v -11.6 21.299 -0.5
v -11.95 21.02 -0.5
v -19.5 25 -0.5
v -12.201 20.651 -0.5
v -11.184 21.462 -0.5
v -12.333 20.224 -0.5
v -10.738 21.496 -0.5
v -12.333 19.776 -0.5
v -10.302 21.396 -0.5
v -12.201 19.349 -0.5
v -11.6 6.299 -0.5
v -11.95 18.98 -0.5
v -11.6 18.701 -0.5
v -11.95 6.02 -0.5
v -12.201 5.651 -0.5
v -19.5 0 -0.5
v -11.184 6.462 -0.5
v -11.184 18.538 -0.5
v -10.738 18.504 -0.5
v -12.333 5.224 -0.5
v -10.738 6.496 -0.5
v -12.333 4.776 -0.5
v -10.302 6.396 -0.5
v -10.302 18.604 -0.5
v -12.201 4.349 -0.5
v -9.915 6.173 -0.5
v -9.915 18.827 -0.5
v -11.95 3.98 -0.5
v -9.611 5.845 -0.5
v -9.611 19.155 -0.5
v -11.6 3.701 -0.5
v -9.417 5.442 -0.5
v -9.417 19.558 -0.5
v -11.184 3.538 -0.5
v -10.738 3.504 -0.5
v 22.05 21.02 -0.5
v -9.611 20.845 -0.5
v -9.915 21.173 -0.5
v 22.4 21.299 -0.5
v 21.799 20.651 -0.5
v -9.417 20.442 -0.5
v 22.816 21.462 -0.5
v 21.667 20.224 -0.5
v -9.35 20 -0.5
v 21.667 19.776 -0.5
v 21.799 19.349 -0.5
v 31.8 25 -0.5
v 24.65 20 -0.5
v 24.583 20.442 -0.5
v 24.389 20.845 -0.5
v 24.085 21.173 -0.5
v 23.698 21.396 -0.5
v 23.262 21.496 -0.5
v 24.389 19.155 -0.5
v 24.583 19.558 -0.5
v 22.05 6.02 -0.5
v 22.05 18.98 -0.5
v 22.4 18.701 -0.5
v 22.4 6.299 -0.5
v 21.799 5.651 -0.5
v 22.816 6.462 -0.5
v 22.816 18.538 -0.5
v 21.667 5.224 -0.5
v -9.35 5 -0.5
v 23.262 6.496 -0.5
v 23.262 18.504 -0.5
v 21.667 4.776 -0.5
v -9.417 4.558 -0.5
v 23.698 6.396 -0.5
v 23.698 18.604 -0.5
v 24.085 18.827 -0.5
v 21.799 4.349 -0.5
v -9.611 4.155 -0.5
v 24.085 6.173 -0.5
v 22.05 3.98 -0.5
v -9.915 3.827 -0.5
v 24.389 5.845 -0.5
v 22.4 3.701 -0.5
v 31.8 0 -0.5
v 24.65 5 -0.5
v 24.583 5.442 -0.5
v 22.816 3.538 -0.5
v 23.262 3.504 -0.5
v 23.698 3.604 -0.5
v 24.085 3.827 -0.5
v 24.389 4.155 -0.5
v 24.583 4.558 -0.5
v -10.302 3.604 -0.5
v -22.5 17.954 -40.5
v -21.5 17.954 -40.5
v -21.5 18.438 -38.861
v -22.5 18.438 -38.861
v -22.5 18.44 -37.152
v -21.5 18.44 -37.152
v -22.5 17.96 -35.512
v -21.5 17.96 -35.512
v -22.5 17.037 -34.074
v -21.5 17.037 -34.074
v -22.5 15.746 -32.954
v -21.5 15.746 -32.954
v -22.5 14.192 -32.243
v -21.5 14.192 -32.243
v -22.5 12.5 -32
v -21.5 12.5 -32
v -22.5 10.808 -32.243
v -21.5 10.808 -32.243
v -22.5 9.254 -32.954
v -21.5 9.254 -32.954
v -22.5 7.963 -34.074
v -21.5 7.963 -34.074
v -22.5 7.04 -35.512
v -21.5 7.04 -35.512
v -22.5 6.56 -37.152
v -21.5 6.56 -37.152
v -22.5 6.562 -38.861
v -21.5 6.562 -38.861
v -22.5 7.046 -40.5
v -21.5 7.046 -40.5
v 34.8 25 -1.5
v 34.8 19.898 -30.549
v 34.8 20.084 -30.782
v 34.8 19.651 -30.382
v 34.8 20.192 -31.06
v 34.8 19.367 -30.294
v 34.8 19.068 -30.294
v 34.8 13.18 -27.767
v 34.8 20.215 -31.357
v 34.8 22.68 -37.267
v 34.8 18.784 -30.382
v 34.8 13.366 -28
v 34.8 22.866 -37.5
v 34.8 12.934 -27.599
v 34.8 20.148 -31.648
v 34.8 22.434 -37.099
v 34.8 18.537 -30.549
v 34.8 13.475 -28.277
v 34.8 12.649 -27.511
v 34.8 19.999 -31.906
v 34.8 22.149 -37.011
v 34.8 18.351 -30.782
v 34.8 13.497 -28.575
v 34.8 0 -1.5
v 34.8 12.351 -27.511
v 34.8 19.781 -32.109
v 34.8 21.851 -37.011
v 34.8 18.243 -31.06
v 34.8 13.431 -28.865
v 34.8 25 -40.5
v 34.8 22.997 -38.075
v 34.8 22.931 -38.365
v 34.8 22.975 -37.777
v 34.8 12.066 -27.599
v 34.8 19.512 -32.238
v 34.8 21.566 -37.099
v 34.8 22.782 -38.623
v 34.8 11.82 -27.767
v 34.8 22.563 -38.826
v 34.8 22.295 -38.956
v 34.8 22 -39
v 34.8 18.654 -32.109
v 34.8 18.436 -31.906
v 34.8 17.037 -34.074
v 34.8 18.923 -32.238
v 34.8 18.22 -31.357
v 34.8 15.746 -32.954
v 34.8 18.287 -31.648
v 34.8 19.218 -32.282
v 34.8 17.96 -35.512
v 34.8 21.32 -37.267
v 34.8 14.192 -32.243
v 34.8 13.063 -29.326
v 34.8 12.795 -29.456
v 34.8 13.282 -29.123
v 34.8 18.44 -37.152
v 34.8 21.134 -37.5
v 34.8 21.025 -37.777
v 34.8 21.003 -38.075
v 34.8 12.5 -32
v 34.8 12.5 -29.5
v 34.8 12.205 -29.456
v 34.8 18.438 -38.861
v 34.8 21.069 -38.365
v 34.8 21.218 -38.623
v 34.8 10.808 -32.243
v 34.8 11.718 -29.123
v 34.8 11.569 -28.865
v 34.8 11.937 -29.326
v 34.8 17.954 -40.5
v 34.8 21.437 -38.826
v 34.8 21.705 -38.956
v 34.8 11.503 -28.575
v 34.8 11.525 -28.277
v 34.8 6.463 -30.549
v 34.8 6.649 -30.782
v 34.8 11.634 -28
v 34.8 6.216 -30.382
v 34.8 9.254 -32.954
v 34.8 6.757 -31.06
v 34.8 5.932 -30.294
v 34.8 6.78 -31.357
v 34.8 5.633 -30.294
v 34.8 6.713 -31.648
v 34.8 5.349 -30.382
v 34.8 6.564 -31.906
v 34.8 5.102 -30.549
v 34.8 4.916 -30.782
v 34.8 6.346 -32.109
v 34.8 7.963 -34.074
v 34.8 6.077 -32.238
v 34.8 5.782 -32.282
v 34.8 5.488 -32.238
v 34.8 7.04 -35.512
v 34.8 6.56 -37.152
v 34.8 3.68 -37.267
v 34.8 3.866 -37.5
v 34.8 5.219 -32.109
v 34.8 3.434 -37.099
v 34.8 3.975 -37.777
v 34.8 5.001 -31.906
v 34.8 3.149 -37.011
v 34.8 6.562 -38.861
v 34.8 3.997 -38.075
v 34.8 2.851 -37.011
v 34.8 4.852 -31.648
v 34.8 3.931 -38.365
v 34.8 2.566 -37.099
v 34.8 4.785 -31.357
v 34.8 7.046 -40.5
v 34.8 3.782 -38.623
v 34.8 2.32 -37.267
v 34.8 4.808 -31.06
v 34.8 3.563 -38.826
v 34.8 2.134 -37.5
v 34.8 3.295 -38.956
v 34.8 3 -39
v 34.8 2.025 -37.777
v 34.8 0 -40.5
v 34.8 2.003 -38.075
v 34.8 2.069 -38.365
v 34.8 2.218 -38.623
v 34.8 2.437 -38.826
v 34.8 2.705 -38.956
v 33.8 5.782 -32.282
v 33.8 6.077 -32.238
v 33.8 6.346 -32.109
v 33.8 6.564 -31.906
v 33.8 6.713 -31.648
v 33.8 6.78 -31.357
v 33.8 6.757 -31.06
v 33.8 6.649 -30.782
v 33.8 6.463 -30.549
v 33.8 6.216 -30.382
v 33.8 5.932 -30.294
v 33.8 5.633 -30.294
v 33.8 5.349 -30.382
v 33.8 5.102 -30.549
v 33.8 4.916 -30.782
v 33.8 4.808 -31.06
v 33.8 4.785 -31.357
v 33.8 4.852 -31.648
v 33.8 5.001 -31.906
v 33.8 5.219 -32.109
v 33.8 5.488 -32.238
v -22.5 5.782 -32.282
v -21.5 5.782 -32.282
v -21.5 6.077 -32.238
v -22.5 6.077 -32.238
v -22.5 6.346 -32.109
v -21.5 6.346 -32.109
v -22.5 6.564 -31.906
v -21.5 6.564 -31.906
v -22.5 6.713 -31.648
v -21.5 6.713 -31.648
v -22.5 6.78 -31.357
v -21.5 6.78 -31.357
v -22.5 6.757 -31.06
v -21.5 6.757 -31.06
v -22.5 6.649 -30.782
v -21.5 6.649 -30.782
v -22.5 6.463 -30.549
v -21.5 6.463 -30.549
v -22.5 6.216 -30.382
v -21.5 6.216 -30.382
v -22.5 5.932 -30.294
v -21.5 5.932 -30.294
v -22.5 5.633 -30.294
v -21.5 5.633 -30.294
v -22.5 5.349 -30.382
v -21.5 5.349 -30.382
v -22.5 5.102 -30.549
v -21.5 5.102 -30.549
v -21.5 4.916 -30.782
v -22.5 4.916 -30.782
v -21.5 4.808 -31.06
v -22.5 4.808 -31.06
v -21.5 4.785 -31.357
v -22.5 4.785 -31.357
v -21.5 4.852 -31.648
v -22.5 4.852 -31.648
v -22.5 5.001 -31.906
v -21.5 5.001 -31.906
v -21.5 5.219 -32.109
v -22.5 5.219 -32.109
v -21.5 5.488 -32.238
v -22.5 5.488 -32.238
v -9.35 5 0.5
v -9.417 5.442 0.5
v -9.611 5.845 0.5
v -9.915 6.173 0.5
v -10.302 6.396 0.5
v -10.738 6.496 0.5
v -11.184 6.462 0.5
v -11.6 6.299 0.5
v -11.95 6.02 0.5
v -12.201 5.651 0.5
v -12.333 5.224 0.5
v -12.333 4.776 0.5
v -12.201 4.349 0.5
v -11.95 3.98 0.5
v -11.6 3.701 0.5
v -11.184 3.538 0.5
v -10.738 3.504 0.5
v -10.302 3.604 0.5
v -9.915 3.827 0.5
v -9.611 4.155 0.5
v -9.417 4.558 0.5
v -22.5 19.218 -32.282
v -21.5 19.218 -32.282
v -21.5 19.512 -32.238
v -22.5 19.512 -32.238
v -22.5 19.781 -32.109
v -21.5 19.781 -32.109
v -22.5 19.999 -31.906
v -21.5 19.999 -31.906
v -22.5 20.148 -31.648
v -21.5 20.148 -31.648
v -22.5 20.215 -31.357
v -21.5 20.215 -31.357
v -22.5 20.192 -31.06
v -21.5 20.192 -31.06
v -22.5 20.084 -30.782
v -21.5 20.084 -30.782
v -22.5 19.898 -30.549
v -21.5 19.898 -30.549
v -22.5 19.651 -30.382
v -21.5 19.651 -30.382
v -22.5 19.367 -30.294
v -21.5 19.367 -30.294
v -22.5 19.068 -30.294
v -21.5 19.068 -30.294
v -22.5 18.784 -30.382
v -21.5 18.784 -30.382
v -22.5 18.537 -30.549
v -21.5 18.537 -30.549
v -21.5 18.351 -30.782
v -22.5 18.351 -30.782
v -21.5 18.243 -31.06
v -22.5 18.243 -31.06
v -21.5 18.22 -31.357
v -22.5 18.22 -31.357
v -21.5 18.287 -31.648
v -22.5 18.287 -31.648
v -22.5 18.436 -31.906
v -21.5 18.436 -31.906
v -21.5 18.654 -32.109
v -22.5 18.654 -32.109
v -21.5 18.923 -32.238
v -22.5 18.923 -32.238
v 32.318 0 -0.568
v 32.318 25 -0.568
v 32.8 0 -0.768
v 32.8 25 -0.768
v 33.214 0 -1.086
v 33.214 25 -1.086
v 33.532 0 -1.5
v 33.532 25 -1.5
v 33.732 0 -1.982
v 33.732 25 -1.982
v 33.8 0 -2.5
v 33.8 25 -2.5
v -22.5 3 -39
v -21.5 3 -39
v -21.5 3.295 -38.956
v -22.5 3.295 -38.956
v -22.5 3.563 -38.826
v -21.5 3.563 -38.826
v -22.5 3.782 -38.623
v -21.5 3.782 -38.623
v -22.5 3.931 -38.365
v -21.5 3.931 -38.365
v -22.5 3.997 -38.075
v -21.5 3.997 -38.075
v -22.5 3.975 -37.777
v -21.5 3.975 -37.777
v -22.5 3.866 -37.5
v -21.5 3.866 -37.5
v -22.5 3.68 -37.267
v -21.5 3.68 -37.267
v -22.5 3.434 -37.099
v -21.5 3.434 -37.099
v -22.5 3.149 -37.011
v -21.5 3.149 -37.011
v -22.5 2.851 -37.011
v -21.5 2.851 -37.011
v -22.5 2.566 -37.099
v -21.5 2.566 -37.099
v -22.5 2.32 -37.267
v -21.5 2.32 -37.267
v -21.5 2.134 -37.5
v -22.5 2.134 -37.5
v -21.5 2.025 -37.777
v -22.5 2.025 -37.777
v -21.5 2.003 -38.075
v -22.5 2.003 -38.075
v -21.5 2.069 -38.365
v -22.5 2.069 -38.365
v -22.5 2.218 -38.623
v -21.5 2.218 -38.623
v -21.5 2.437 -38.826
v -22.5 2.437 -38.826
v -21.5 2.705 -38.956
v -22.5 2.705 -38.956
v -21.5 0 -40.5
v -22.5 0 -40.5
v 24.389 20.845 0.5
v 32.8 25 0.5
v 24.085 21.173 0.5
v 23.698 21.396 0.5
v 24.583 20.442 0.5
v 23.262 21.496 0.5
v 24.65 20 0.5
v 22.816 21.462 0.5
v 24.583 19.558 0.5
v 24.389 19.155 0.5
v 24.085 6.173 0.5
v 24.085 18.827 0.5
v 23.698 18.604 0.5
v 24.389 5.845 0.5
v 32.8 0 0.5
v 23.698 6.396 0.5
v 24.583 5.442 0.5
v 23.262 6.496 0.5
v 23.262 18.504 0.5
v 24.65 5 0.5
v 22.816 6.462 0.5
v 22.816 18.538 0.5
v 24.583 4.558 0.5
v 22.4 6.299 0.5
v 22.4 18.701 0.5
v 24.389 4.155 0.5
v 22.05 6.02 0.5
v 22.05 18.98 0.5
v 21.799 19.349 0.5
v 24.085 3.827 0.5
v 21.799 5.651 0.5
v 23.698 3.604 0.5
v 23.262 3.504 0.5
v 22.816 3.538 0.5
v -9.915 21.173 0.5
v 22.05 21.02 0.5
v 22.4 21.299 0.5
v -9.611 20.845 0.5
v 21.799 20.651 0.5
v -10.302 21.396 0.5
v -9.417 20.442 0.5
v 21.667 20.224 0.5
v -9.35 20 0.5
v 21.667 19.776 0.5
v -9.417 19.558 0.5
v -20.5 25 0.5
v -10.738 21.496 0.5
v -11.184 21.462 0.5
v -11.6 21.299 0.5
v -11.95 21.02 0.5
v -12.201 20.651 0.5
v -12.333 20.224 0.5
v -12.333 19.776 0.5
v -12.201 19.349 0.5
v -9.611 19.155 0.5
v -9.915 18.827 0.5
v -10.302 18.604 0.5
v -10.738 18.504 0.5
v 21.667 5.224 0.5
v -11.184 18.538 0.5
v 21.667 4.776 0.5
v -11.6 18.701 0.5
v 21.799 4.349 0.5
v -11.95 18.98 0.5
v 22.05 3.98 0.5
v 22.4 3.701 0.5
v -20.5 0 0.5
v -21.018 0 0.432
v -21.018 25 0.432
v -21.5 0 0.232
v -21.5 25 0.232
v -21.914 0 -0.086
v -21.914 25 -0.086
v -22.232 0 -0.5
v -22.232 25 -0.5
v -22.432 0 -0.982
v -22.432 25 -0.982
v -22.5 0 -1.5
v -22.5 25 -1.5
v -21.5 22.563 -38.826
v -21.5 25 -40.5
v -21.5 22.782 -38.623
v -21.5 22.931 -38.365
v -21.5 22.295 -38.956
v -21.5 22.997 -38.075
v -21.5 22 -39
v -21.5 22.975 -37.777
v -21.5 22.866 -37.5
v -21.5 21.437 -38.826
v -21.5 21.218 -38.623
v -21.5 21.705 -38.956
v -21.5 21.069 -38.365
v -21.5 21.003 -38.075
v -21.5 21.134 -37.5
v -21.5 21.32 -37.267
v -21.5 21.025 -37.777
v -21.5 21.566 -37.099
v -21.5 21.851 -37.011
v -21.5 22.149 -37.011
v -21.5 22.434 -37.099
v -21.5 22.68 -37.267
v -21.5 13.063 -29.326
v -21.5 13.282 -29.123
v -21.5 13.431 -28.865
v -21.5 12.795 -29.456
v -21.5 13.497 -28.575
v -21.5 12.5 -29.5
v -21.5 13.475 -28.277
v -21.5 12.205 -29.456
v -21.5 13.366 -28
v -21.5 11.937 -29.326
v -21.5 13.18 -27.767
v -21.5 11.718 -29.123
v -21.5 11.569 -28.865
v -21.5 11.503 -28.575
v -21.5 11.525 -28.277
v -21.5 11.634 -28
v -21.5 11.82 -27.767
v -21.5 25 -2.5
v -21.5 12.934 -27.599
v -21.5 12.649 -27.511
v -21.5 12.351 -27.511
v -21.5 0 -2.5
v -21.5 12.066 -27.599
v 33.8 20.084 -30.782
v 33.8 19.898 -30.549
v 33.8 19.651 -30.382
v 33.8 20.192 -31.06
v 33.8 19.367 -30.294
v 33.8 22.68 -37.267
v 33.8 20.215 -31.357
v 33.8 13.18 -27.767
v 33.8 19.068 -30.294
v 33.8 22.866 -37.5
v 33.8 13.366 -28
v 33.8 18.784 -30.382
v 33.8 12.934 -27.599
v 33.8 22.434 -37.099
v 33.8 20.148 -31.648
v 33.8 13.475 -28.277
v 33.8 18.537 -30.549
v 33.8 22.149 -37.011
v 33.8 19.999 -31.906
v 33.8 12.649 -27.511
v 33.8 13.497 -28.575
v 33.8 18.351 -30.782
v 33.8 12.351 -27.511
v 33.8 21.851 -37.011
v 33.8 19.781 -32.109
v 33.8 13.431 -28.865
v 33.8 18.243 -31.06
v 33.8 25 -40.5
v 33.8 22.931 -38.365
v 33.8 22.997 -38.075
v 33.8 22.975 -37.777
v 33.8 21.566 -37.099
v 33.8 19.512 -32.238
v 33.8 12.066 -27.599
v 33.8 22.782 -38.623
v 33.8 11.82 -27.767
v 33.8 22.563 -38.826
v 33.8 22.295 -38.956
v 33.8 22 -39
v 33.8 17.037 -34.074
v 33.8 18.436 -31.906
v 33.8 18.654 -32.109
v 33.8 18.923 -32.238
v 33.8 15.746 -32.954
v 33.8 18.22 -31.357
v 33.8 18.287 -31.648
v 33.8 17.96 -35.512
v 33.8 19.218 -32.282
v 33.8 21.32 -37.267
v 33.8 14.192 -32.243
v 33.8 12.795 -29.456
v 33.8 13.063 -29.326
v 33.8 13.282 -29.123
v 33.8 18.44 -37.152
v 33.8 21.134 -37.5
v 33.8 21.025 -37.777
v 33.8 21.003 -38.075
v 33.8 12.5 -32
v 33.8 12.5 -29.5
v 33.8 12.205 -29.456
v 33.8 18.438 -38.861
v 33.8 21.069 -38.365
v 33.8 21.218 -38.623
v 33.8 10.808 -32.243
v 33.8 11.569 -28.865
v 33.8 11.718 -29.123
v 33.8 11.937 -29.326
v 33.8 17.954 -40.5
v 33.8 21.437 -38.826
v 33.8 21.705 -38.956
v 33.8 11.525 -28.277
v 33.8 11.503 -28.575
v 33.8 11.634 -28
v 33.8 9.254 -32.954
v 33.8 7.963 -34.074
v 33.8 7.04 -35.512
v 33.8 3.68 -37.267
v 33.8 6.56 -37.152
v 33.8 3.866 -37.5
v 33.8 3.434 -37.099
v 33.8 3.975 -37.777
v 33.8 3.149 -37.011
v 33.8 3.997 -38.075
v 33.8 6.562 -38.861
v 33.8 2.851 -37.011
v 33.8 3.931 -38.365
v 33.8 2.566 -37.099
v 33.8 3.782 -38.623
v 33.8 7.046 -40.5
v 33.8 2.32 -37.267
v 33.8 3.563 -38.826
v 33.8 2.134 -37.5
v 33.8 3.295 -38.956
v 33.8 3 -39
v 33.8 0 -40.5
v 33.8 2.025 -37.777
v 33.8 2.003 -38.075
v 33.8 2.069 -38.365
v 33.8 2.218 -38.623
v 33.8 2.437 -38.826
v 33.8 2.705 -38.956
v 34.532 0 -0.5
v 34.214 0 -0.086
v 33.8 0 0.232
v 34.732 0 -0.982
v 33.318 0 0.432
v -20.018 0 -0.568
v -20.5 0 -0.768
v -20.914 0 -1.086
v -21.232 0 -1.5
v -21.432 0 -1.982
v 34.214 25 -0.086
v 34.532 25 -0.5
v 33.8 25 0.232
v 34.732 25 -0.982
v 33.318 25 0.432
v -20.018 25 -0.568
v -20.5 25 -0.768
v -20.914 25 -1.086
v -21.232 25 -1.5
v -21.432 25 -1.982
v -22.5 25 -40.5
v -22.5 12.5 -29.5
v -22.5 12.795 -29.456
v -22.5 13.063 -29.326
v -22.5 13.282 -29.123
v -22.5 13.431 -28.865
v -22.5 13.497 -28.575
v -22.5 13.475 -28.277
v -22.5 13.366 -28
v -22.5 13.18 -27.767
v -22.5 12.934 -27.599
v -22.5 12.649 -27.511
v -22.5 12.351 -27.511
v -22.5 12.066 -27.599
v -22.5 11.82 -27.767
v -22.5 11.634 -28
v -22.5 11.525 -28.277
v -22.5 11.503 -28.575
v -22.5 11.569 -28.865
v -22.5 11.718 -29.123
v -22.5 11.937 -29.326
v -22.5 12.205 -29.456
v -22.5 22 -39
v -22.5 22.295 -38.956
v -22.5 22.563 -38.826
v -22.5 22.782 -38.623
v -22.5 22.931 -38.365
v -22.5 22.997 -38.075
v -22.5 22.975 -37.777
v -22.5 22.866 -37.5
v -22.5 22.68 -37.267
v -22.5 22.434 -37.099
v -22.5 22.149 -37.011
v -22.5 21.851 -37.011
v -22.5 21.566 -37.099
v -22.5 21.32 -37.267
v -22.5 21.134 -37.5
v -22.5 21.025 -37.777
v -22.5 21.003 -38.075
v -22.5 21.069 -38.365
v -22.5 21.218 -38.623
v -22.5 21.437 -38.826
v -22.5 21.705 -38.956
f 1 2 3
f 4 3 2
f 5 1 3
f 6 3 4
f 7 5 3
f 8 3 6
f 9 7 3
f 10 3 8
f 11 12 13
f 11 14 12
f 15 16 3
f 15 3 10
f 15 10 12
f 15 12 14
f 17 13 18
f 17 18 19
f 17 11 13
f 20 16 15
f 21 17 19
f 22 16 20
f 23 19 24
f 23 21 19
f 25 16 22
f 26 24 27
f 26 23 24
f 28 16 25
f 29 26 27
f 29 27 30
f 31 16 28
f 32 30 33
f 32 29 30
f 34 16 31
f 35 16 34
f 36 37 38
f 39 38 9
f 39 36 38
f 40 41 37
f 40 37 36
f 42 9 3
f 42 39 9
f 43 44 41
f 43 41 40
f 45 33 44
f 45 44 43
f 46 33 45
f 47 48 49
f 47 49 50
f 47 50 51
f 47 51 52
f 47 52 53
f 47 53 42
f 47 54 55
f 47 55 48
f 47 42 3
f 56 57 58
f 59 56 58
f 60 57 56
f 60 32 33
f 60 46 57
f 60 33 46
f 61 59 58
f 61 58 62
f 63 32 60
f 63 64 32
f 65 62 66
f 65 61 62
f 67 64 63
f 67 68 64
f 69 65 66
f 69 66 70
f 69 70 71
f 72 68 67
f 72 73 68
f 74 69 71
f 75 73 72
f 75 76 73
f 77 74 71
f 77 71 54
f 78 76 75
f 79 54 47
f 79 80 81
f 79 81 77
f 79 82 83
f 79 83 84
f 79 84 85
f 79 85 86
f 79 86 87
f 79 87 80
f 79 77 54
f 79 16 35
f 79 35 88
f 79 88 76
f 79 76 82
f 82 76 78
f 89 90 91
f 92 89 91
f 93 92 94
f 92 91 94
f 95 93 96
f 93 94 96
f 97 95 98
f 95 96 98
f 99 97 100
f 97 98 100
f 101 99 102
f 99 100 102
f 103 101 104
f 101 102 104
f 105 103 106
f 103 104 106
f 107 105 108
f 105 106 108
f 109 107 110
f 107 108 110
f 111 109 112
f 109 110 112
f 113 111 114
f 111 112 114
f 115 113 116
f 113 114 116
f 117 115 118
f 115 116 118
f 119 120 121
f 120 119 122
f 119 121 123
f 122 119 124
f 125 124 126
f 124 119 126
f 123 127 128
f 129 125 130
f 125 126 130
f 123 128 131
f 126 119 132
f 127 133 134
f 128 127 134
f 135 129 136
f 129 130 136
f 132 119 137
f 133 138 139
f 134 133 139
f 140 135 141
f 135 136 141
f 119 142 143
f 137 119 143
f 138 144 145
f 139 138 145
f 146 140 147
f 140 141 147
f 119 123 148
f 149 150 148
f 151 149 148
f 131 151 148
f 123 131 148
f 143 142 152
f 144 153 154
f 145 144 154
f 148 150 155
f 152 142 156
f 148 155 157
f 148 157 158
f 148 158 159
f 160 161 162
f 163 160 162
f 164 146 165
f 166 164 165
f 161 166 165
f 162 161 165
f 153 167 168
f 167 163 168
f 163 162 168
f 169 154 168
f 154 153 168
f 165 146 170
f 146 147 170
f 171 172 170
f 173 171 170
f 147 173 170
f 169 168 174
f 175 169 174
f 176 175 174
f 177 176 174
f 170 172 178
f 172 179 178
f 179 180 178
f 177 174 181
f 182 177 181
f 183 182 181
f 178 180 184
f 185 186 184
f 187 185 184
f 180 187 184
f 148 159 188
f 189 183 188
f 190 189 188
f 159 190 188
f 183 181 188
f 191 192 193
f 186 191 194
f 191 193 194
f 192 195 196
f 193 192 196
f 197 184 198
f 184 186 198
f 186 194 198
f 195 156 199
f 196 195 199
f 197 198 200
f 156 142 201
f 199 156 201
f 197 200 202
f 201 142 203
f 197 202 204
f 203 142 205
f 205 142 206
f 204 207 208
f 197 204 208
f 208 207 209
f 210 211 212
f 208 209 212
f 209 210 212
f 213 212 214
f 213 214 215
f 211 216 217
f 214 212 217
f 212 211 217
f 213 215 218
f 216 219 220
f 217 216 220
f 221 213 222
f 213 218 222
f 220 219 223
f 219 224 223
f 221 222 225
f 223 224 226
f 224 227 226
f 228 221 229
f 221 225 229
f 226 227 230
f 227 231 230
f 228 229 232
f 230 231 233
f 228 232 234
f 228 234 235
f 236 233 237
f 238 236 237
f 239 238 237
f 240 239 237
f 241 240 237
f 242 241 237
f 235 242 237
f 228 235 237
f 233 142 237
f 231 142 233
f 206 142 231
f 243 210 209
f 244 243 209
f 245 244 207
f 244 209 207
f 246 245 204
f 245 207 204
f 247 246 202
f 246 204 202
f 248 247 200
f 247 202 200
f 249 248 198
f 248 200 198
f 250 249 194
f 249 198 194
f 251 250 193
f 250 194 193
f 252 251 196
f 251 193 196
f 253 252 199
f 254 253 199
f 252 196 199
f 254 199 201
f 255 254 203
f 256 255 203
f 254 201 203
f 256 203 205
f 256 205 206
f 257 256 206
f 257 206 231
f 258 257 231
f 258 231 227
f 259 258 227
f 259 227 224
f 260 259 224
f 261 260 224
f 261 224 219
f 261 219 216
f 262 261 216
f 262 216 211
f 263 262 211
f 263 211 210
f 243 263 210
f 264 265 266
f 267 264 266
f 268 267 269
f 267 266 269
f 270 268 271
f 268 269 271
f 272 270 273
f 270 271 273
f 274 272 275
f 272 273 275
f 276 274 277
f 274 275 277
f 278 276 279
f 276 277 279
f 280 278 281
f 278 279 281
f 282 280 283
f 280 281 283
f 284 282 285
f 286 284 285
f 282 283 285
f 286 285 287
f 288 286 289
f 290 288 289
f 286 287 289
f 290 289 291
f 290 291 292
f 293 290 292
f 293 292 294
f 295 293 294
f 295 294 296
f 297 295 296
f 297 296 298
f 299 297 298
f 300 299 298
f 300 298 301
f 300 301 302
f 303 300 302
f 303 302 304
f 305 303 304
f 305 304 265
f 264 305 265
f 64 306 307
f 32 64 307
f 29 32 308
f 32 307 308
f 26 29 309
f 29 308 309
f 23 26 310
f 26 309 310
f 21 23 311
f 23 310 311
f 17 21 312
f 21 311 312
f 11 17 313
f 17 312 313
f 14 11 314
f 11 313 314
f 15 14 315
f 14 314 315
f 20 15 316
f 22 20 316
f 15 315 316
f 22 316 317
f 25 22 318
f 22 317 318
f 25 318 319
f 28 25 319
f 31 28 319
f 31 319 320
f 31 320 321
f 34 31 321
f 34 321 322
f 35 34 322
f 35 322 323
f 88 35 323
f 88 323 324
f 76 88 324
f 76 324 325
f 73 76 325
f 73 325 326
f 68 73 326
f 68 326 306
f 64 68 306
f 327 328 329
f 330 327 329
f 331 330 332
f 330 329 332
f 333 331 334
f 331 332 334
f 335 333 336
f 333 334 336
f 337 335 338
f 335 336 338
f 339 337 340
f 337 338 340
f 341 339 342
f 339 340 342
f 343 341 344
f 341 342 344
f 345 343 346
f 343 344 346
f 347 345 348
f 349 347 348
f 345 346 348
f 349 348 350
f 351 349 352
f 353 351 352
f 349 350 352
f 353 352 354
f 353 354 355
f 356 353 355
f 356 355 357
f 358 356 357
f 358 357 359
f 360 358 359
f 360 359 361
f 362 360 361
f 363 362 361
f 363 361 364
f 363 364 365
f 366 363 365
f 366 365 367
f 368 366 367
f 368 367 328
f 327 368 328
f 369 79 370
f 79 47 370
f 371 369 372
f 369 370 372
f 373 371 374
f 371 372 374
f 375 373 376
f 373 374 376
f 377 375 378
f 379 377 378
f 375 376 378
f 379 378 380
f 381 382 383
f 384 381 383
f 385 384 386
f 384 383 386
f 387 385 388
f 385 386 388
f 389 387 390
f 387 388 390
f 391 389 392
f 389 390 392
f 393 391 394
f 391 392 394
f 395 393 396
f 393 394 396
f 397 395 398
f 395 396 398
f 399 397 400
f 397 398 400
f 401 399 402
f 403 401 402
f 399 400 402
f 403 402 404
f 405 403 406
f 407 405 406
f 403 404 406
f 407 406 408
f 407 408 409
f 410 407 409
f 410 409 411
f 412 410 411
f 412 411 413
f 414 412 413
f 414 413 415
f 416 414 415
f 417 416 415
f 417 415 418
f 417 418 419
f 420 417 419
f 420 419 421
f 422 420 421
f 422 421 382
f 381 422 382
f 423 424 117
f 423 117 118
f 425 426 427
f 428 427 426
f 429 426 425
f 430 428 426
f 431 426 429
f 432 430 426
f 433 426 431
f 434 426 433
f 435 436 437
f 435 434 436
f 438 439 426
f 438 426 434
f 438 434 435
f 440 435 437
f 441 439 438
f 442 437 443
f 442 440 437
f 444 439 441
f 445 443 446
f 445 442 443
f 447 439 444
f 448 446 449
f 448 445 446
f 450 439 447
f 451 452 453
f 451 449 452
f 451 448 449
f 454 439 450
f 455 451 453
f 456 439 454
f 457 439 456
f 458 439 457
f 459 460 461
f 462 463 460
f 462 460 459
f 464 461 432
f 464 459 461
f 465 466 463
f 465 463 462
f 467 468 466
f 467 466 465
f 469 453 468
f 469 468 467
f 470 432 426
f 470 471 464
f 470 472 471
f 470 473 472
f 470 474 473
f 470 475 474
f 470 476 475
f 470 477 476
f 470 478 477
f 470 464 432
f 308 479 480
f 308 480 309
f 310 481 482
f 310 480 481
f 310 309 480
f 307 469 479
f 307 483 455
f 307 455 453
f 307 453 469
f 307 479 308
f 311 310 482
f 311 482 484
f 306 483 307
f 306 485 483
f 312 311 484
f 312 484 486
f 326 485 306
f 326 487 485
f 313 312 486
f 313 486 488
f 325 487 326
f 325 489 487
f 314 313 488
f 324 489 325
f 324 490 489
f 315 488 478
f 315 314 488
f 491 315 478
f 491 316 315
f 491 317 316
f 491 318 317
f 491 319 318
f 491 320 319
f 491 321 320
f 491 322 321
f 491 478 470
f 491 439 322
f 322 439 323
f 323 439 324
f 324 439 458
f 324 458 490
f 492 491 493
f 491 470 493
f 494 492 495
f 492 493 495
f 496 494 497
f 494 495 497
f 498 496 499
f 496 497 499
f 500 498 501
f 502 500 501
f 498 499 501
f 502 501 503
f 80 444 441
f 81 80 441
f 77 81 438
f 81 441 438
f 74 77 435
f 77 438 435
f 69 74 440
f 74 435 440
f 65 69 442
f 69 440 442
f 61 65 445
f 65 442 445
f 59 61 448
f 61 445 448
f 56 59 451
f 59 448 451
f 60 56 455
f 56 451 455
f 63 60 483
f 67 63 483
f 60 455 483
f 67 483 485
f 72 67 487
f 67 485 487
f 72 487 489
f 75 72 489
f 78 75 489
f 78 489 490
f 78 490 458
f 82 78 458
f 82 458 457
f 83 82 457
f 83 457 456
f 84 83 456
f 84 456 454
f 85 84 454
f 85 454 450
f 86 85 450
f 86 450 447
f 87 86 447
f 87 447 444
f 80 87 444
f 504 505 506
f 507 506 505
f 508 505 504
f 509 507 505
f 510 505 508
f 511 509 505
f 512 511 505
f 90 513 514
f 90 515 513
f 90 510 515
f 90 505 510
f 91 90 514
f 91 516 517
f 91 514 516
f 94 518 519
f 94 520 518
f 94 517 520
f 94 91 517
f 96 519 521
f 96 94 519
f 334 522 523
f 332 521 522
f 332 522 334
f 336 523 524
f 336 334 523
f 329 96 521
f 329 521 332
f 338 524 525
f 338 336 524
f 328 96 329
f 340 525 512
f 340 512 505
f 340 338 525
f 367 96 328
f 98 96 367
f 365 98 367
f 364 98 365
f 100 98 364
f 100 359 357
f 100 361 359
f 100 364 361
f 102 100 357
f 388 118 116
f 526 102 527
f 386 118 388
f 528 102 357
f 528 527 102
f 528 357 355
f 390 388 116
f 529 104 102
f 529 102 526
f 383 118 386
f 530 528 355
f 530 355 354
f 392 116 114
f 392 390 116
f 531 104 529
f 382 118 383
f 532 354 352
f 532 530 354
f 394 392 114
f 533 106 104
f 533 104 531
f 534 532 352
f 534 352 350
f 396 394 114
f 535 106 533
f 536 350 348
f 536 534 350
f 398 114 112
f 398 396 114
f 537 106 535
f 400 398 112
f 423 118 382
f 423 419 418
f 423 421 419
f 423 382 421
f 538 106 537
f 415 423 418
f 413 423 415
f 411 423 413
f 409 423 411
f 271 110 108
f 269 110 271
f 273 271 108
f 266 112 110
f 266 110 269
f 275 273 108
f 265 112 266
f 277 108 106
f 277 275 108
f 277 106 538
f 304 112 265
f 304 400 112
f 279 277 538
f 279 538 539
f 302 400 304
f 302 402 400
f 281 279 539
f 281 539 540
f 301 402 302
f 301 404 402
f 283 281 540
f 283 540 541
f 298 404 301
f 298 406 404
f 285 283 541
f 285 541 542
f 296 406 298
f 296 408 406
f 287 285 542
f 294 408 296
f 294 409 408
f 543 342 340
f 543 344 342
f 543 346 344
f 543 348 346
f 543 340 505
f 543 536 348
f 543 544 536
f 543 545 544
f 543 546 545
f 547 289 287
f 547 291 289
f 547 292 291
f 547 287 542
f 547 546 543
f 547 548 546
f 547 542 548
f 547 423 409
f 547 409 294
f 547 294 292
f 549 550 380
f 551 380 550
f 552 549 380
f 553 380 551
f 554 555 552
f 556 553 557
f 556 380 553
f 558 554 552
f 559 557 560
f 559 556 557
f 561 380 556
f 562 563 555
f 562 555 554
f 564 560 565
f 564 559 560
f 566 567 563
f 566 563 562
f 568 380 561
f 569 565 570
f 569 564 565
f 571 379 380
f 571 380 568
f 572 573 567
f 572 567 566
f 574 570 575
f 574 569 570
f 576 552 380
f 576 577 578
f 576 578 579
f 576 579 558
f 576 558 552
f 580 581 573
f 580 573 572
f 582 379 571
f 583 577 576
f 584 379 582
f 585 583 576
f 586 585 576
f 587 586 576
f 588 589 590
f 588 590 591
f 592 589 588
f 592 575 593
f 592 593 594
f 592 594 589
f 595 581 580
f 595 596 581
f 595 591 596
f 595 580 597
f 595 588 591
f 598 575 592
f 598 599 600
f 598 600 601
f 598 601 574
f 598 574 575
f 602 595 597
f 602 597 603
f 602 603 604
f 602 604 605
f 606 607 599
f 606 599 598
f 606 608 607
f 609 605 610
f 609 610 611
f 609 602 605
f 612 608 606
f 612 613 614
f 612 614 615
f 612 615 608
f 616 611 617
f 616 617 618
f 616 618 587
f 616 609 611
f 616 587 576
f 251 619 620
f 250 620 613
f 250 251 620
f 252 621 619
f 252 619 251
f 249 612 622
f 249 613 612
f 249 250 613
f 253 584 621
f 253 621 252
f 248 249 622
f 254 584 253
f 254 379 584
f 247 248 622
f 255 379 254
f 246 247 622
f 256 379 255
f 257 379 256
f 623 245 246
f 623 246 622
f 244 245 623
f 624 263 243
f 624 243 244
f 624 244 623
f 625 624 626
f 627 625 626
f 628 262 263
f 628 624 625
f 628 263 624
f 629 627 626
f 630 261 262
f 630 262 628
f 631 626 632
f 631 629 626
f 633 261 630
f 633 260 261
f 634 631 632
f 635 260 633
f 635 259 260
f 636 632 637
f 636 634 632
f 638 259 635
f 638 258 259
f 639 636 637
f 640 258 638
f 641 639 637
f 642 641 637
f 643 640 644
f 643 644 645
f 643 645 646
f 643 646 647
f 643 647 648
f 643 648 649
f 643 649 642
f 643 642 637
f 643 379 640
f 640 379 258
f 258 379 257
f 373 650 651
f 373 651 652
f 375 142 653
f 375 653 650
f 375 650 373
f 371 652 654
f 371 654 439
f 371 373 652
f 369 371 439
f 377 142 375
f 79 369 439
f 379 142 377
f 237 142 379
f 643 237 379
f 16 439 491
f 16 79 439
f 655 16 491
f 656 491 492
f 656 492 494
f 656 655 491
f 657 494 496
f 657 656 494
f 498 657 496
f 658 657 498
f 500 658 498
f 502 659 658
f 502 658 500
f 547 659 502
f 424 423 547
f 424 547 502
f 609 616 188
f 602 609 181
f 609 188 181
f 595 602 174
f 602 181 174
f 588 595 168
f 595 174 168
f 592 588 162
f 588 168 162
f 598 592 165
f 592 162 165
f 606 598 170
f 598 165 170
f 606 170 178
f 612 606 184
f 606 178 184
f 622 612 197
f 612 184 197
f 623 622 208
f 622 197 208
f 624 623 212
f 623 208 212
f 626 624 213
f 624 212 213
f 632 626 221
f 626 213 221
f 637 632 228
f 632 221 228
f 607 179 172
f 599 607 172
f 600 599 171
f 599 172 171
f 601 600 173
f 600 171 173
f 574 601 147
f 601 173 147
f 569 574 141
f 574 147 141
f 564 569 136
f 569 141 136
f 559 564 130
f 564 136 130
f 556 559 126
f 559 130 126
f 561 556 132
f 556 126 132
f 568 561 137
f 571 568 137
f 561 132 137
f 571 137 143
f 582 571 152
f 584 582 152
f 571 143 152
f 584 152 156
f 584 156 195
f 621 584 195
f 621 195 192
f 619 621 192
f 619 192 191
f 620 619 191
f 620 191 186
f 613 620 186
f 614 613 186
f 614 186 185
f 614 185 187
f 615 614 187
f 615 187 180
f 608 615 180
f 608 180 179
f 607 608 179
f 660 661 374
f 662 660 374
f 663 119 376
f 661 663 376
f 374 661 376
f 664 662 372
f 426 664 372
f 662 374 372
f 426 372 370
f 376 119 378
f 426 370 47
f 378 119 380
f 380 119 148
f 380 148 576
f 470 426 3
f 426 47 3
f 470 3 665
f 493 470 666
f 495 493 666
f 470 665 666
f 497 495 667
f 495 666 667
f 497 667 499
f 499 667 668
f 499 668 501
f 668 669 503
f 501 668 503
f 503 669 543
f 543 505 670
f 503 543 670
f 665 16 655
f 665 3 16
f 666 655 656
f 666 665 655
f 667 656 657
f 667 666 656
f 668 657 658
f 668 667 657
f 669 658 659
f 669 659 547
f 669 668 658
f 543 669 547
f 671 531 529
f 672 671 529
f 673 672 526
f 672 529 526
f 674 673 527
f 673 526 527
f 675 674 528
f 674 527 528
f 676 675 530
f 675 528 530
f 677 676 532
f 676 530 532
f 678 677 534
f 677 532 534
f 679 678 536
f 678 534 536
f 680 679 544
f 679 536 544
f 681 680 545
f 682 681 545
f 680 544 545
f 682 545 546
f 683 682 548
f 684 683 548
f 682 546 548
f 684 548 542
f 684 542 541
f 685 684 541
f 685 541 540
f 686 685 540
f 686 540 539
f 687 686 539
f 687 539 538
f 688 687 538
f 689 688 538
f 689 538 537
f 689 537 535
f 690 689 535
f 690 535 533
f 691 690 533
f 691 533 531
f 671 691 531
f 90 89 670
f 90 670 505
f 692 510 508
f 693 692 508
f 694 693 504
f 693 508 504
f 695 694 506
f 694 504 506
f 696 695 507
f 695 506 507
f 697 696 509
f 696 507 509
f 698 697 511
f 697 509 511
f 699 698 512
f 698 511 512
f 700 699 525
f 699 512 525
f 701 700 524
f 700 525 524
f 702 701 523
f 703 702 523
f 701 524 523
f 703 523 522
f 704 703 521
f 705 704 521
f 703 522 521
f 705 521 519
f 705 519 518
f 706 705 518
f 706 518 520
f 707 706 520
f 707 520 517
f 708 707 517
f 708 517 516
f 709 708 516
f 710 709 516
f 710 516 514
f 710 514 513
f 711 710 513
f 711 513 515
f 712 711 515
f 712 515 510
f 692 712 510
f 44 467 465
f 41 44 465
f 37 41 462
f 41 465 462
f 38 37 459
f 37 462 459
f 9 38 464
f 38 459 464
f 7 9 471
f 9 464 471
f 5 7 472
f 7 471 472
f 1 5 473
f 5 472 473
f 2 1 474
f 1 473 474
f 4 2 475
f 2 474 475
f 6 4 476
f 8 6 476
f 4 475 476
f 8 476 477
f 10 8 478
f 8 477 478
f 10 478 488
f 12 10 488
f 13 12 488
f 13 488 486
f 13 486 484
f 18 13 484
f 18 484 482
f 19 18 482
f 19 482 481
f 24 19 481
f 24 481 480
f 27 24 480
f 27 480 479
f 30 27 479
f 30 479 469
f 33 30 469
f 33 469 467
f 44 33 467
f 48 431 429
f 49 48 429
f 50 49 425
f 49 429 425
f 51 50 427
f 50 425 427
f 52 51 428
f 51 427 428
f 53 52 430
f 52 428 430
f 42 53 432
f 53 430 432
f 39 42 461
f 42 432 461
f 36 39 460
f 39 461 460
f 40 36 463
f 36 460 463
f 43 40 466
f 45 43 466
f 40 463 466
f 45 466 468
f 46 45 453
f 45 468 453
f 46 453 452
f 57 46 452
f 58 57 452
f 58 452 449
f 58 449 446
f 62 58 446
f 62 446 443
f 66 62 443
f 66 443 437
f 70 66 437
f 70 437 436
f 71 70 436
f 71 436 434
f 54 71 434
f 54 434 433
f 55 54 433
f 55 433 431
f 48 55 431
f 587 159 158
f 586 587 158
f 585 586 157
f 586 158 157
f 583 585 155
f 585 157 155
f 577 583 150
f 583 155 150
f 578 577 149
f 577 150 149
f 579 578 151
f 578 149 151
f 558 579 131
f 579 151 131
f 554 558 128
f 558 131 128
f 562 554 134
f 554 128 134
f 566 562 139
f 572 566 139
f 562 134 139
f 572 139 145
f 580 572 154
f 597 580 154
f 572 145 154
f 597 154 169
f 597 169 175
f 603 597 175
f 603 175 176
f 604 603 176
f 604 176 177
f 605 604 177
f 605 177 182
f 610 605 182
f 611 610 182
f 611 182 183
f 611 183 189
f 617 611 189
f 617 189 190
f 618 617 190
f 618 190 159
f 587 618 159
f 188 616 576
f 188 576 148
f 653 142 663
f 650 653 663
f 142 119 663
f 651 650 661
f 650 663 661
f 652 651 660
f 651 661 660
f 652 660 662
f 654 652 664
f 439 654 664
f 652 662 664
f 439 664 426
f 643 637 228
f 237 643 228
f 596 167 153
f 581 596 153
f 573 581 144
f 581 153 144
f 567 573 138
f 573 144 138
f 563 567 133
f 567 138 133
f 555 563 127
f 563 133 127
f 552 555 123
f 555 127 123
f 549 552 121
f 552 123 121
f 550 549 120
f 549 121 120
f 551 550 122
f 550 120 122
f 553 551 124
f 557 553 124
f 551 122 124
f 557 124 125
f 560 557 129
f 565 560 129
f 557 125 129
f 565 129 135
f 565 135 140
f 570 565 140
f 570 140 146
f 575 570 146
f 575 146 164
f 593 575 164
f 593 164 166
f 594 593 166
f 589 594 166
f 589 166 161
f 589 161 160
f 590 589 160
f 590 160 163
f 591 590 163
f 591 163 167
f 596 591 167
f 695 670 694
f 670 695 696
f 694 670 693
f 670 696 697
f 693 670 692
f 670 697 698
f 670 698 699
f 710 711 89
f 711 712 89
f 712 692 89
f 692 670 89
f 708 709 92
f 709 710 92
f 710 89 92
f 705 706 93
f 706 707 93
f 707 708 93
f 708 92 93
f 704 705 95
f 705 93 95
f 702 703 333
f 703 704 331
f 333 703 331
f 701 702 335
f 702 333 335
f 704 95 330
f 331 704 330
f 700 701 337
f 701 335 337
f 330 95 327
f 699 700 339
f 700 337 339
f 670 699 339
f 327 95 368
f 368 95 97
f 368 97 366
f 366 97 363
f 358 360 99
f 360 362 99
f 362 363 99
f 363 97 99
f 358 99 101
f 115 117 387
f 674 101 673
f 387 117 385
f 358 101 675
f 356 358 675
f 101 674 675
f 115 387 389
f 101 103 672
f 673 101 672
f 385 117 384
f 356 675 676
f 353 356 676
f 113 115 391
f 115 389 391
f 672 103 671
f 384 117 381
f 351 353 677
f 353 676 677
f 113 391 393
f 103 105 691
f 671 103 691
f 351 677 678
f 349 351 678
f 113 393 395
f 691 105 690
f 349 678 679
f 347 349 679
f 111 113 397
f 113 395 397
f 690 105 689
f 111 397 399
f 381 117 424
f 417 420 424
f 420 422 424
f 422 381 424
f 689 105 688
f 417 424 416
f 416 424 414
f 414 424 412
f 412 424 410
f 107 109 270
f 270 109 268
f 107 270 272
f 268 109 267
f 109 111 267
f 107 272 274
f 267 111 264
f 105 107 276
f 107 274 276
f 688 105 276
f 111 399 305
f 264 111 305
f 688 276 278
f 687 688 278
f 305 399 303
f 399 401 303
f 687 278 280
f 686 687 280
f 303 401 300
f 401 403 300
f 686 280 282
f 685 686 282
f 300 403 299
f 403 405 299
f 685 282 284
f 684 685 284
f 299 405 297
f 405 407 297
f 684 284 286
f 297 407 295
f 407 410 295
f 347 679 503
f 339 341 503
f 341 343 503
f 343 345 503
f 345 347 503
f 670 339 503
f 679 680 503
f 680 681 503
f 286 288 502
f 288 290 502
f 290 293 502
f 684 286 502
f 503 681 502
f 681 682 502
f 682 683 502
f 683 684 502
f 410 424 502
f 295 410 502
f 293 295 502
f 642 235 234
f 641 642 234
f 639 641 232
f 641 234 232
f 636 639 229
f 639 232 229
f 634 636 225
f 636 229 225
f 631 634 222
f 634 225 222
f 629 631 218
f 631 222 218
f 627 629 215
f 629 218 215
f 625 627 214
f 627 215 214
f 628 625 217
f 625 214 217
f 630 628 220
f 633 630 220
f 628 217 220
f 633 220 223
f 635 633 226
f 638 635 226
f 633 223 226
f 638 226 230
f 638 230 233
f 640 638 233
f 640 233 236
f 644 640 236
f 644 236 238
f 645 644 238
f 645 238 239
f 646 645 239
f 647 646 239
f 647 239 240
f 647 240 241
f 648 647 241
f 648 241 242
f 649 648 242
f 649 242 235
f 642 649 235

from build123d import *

# Parameters (mm, degrees)
BOSS_EXTRUDE1_DEPTH = 25
SKETCH2_R           = 1
SKETCH2_R_2         = 6
CUT_EXTRUDE1_DEPTH  = 58.3
FILLET2_R           = 2
SKETCH3_R           = 1.5
CUT_EXTRUDE2_DEPTH  = 42


with BuildPart() as part:
    # Sketch1 → Boss-Extrude1 (new body)
    with BuildSketch(Plane(origin=(0, 0, 0), x_dir=(1, 0, 0), z_dir=(0, 1, 0))):
        Polygon((-21.5, 0.5), (33.8, 0.5), (33.8, 40.5), (34.8, 40.5), (34.8, 0.5), (34.8, -0.5), (-22.5, -0.5), (-22.5, 0.5), (-22.5, 40.5), (-21.5, 40.5), align=None)
    extrude(amount=BOSS_EXTRUDE1_DEPTH)

    # Sketch2 → Cut-Extrude1 (cut, through all)
    with BuildSketch(Plane(origin=(34.8, 0, 0), x_dir=(0, 0, -1), z_dir=(1, 0, 0))):
        with Locations((28.5, 12.5)):
            Circle(SKETCH2_R)
        with Locations((38, 12.5)):
            Circle(SKETCH2_R_2)
        with Locations((31.282485579, 19.217514421)):
            Circle(SKETCH2_R)
        with Locations((38, 22)):
            Circle(SKETCH2_R)
        with Locations((38, 3)):
            Circle(SKETCH2_R)
        with Locations((31.282485579, 5.782485579)):
            Circle(SKETCH2_R)
    extrude(amount=-CUT_EXTRUDE1_DEPTH, mode=Mode.SUBTRACT)

    # Fillet2
    fillet2_edges = [part.edges().sort_by_distance(p)[0] for p in [
        (34.8, 12.5, 0.5),
        (-22.5, 12.5, 0.5),
        (-21.5, 12.5, -0.5),
        (33.8, 12.5, -0.5),
    ]]
    fillet(fillet2_edges, radius=FILLET2_R)

    # Sketch3 → Cut-Extrude2 (cut, through all)
    with BuildSketch(Plane.XY.offset(0.5)):
        with Locations((-10.85, 20)):
            Circle(SKETCH3_R)
        with Locations((23.15, 20)):
            Circle(SKETCH3_R)
        with Locations((-10.85, 5)):
            Circle(SKETCH3_R)
        with Locations((23.15, 5)):
            Circle(SKETCH3_R)
    extrude(amount=-CUT_EXTRUDE2_DEPTH, mode=Mode.SUBTRACT)


solid = part.part
